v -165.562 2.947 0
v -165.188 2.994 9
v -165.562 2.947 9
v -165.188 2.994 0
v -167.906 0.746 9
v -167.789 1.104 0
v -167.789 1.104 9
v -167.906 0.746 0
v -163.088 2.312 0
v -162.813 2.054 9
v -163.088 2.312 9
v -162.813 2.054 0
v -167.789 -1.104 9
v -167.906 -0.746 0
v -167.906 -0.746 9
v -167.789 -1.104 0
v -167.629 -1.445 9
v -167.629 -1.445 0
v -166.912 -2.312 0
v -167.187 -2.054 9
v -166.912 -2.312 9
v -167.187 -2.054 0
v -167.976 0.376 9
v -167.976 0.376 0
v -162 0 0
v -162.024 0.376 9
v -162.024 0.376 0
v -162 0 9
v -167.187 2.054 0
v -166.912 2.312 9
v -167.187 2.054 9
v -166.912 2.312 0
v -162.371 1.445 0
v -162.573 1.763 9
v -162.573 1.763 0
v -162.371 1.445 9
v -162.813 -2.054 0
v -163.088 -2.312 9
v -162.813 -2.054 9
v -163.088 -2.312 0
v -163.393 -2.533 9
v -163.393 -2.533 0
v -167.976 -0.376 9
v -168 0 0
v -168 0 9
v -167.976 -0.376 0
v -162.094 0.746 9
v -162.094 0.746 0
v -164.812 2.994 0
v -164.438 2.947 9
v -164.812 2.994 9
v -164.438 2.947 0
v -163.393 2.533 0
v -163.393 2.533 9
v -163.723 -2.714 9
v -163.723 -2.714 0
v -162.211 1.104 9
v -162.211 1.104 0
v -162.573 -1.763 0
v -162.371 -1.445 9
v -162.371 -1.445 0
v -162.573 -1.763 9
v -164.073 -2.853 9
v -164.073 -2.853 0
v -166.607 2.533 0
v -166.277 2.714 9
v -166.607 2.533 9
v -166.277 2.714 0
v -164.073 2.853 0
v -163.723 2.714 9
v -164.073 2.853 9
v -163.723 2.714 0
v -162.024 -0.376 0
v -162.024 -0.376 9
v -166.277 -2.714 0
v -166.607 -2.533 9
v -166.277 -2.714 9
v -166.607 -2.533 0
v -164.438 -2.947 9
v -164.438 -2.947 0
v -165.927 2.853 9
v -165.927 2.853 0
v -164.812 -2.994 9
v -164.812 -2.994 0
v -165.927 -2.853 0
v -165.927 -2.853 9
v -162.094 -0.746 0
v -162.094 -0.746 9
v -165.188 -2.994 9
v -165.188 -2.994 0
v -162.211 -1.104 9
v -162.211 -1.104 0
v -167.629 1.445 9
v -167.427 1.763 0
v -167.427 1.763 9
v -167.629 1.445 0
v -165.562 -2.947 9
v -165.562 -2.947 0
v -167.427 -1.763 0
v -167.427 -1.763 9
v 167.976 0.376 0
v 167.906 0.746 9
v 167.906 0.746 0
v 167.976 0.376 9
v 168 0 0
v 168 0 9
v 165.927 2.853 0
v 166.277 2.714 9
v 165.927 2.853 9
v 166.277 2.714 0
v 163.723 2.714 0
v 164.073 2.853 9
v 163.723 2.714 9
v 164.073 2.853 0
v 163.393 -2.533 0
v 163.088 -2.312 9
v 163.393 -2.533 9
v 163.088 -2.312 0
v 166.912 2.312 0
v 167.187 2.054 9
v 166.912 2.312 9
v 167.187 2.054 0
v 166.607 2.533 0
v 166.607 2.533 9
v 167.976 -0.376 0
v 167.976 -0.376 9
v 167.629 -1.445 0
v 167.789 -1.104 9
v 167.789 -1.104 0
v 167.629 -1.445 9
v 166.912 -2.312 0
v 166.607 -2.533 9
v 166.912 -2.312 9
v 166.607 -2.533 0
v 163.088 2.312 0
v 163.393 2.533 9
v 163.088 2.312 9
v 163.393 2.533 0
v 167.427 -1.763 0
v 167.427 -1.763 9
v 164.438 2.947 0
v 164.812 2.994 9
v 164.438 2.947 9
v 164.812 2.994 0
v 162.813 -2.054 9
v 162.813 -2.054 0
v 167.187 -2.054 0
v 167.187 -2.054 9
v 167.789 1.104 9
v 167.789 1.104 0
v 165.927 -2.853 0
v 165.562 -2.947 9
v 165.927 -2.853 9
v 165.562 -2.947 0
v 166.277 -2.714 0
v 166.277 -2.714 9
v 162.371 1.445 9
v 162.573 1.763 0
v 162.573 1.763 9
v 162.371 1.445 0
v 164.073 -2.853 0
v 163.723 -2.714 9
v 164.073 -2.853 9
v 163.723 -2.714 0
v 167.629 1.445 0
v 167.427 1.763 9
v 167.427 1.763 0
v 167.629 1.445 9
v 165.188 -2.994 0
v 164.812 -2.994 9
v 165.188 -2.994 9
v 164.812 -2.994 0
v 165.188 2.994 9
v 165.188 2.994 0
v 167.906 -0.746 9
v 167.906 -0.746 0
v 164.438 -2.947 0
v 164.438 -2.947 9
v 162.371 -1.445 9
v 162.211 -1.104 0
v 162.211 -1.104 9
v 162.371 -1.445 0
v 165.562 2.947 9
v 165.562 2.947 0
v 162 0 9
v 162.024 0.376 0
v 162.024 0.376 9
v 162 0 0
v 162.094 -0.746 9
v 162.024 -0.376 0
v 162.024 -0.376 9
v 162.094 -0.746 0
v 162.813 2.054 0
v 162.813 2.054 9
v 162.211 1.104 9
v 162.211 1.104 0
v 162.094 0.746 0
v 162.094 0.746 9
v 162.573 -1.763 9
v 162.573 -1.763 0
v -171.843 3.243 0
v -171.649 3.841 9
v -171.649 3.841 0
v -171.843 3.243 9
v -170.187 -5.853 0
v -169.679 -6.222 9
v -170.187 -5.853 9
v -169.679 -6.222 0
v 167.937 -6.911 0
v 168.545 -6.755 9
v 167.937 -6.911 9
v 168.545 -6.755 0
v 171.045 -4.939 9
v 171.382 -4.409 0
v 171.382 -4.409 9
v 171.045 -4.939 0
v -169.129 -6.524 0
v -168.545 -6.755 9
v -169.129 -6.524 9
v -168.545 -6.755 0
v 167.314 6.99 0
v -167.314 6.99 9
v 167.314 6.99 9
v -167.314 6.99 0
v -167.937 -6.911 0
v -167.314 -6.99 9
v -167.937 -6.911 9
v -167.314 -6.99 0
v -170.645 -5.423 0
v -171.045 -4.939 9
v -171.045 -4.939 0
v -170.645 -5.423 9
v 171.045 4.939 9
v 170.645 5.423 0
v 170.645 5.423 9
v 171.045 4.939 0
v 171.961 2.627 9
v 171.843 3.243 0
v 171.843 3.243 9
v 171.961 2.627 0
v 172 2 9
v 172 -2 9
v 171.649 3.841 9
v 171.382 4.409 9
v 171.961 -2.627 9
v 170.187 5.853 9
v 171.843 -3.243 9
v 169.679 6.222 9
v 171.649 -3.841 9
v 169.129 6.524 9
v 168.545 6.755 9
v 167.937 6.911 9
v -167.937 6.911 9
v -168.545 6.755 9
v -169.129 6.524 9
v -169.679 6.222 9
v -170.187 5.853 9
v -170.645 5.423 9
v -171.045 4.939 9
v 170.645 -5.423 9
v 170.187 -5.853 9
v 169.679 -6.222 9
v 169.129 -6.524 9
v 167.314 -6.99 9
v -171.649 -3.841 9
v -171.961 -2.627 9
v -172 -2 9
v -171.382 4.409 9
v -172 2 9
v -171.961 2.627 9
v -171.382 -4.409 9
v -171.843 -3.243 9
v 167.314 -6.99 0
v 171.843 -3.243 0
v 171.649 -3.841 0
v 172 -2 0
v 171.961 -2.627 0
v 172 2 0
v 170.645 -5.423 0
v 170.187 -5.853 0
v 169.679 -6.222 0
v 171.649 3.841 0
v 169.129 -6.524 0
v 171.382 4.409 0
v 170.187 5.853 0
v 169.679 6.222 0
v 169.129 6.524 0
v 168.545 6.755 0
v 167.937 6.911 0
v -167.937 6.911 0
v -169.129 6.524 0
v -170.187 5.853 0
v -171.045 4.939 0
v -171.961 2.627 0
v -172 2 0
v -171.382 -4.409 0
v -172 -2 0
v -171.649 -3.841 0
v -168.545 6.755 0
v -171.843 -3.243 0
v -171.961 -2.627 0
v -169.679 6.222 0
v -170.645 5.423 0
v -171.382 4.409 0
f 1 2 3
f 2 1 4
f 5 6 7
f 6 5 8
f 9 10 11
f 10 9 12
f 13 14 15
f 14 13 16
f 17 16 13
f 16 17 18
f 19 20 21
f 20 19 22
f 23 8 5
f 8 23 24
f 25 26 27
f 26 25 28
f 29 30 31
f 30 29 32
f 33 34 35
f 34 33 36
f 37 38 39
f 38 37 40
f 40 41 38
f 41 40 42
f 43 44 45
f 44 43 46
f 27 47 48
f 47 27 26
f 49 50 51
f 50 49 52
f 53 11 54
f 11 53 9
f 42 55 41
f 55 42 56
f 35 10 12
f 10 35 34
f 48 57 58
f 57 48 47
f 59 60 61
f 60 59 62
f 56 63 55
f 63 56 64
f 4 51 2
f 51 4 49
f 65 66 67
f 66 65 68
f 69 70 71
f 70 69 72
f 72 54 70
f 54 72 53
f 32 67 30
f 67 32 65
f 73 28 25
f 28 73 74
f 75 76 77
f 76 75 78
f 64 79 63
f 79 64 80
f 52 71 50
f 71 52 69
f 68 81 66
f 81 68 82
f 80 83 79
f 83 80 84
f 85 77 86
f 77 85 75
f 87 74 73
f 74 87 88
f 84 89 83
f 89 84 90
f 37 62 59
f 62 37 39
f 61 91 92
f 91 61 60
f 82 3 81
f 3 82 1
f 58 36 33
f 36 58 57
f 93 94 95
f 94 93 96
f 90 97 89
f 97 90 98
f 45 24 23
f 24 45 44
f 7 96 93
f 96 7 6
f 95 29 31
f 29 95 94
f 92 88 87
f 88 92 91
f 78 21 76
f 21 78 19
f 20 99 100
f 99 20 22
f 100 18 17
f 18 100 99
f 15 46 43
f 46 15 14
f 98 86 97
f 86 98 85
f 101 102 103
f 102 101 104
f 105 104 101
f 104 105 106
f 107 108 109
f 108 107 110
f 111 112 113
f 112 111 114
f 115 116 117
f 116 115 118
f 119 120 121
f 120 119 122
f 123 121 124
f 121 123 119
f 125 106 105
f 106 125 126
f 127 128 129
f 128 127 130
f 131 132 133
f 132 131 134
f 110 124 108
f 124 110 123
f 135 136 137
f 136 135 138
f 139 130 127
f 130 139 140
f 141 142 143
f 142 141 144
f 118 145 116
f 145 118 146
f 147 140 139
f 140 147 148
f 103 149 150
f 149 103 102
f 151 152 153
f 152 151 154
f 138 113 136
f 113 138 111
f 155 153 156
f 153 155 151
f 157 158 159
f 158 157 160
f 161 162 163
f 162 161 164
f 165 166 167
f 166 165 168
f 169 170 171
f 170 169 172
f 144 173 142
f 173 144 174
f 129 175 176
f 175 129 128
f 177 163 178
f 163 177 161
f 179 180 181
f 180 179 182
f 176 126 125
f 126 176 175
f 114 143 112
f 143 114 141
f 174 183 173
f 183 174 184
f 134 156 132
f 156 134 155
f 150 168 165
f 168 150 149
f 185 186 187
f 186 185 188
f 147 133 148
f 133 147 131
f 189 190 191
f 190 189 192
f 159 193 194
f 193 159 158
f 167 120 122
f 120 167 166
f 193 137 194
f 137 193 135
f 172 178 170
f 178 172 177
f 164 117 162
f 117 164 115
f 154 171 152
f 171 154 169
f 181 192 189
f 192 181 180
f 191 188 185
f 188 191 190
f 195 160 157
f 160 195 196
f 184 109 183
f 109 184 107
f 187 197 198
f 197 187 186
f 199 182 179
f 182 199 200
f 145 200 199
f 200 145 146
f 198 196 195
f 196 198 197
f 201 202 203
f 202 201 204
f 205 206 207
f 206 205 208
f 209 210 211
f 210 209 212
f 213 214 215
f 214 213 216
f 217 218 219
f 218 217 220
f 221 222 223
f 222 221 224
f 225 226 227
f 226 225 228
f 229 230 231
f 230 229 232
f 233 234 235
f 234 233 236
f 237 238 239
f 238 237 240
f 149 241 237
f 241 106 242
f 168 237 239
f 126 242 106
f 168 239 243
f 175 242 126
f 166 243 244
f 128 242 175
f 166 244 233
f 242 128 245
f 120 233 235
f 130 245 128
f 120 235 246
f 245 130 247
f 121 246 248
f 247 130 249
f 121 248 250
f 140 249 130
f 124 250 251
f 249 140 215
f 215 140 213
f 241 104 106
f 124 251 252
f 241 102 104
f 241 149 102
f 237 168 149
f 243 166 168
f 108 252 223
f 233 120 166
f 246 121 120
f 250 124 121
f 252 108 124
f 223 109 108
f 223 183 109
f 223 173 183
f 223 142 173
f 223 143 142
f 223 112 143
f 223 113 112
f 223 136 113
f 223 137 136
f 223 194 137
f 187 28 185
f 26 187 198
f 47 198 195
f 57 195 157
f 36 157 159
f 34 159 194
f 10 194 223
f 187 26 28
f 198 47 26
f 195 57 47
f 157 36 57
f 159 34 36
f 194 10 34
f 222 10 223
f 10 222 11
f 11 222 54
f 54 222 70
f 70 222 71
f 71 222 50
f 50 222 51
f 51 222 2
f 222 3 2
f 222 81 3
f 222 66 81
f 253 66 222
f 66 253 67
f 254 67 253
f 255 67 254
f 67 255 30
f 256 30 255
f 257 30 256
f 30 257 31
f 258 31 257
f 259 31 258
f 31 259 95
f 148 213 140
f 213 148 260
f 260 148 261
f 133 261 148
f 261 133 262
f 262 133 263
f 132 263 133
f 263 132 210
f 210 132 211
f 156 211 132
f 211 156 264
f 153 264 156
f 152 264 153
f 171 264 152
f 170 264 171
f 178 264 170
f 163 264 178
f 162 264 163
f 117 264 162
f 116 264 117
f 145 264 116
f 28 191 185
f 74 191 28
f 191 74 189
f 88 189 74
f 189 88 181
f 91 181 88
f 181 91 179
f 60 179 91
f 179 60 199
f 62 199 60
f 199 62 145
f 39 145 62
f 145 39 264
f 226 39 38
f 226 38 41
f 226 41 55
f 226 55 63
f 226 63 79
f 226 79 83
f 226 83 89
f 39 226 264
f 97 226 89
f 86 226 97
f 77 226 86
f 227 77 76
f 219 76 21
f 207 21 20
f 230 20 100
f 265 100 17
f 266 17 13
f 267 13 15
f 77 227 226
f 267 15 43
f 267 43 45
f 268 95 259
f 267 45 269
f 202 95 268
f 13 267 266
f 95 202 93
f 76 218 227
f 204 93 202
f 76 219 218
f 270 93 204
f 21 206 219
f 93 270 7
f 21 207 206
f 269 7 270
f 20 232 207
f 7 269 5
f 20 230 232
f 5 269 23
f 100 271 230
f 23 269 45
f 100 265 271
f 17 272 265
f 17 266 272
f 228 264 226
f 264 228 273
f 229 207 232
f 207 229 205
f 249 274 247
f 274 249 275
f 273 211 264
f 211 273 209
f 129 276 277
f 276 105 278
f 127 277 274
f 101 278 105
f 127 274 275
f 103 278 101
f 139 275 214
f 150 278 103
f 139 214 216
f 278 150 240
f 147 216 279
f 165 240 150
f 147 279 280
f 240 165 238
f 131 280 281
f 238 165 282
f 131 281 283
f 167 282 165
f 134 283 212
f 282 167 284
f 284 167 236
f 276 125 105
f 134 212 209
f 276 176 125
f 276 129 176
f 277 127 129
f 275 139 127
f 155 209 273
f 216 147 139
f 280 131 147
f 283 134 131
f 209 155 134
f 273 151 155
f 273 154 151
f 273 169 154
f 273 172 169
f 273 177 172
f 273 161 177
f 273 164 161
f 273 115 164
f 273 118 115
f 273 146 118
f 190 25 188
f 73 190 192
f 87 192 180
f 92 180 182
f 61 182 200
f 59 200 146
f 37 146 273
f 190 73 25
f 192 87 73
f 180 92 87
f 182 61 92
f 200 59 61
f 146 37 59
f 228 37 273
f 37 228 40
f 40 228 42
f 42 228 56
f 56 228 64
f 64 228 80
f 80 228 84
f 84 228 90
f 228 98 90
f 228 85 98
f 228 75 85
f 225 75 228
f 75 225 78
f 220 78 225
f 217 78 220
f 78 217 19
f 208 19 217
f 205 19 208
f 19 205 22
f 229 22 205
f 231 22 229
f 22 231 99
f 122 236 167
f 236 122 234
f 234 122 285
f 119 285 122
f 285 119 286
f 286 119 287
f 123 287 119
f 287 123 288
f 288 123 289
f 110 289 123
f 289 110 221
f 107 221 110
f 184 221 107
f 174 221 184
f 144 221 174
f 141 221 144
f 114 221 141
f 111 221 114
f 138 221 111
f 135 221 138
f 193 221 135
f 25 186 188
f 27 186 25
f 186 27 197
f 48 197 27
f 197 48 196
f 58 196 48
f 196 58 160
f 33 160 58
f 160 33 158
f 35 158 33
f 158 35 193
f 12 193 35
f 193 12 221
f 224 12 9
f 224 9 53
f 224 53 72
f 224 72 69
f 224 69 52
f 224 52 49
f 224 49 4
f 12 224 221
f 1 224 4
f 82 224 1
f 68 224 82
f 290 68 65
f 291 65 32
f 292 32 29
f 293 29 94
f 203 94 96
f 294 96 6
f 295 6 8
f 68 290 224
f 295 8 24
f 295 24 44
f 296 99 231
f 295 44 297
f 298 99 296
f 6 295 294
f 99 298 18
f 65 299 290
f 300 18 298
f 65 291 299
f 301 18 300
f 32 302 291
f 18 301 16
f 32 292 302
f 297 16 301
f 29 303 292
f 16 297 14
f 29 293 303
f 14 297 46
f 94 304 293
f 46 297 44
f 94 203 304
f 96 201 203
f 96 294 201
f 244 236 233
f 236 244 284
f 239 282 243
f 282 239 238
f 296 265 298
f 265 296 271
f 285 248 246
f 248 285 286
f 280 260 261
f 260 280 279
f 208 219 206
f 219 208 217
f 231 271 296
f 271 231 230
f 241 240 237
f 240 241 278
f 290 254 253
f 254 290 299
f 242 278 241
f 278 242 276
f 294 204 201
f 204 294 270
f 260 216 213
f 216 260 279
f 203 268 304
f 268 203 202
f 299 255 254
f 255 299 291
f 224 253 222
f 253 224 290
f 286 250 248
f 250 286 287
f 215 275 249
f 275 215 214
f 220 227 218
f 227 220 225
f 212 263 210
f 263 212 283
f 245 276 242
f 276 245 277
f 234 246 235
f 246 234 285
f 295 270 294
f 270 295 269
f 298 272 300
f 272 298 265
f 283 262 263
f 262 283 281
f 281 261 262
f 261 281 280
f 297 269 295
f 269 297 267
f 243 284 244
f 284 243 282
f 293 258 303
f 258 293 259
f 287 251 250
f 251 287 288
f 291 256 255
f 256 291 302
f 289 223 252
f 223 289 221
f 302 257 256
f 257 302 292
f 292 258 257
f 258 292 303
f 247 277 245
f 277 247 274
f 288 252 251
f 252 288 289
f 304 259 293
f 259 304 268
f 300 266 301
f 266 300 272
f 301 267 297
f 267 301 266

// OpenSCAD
$fn = 50;


difference() {
	union() {
		hull() {
			translate(v = [-167.0000000000, 2.0000000000, 0]) {
				cylinder(h = 9, r = 5);
			}
			translate(v = [167.0000000000, 2.0000000000, 0]) {
				cylinder(h = 9, r = 5);
			}
			translate(v = [-167.0000000000, -2.0000000000, 0]) {
				cylinder(h = 9, r = 5);
			}
			translate(v = [167.0000000000, -2.0000000000, 0]) {
				cylinder(h = 9, r = 5);
			}
		}
	}
	union() {
		translate(v = [-165.0000000000, 0.0000000000, -100.0000000000]) {
			cylinder(h = 200, r = 3.0000000000);
		}
		translate(v = [-165.0000000000, 0.0000000000, -100.0000000000]) {
			cylinder(h = 200, r = 3.0000000000);
		}
		translate(v = [165.0000000000, 0.0000000000, -100.0000000000]) {
			cylinder(h = 200, r = 3.0000000000);
		}
		translate(v = [165.0000000000, 0.0000000000, -100.0000000000]) {
			cylinder(h = 200, r = 3.0000000000);
		}
	}
}
